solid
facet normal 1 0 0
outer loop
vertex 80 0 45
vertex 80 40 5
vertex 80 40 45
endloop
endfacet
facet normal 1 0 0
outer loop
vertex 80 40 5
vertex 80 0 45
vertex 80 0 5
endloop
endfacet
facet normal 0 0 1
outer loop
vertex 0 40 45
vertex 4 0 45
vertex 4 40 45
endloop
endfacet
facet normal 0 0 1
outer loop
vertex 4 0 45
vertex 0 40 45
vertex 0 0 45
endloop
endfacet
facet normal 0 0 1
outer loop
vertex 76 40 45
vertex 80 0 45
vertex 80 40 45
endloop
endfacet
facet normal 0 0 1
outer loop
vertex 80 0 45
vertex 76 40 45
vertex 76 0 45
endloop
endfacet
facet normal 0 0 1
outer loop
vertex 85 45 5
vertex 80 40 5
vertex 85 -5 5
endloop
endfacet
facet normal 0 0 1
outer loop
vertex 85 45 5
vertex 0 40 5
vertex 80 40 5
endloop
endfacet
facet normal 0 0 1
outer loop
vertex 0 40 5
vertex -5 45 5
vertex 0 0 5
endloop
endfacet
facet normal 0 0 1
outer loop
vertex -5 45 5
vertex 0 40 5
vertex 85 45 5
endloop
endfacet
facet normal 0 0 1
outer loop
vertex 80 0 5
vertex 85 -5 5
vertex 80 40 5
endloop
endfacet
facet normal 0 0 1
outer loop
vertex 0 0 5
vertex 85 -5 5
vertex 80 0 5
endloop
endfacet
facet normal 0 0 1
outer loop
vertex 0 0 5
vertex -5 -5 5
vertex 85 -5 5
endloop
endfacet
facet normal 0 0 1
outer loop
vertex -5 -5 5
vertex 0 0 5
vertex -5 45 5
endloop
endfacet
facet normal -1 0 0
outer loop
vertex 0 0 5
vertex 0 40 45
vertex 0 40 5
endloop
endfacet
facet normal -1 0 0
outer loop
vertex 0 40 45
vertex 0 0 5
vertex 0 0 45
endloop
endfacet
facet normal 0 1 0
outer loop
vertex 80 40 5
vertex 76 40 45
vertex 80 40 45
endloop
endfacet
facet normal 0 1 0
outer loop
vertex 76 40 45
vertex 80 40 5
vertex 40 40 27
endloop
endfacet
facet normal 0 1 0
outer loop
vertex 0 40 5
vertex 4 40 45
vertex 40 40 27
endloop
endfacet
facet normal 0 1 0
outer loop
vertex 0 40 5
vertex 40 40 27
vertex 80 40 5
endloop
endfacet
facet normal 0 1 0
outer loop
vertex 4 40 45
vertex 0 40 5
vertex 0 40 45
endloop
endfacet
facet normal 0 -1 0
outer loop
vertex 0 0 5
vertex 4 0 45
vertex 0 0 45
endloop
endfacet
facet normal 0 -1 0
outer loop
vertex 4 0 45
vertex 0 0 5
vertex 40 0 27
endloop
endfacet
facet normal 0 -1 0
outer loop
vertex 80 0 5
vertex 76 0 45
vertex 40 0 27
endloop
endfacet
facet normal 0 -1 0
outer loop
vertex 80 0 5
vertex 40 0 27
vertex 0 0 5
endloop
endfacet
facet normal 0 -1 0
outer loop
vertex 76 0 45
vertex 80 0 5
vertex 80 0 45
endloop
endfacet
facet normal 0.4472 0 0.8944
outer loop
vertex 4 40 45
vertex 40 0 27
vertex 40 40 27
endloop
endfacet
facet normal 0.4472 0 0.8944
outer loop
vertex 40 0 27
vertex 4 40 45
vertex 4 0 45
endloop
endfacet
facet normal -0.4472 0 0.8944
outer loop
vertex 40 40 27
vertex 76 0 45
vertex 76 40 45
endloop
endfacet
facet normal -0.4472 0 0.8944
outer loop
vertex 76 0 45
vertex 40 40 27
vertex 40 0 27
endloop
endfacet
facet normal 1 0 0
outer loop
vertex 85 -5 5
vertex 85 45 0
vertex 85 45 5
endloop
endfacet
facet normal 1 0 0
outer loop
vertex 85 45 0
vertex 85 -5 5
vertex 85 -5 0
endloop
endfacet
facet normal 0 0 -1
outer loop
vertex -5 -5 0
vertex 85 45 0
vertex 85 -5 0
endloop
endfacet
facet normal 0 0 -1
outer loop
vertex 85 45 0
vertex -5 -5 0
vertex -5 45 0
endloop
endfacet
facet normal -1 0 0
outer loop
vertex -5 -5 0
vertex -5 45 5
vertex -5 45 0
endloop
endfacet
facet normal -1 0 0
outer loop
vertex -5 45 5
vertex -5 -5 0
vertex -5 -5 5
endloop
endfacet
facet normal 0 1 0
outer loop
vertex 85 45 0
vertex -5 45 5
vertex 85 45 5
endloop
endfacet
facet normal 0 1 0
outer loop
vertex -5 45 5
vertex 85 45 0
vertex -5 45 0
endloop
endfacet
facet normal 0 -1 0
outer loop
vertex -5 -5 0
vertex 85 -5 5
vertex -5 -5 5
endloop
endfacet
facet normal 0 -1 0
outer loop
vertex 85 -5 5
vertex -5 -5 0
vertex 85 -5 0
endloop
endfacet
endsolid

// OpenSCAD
/* [Global] */

// The height of the base
base_height=5;

// The width of the support
support_width=80;

// The height of the support
support_height=40;

/* [Hidden] */
$fn=128;

translate([-5, -5, 0])
cube([support_width+10, 50, base_height]);

translate([0, 0, base_height])
difference() {
  cube([support_width, 40, support_height]);

  translate([0, 0, support_height-18])
  rotate(a=[90,0,0])
  linear_extrude(h=support_width/2, center=true, convexity=10, twist=0)
  polygon(points=[[support_width/2,0], [support_width,20], [0,20]], paths=[[0,1,2]]);
}
